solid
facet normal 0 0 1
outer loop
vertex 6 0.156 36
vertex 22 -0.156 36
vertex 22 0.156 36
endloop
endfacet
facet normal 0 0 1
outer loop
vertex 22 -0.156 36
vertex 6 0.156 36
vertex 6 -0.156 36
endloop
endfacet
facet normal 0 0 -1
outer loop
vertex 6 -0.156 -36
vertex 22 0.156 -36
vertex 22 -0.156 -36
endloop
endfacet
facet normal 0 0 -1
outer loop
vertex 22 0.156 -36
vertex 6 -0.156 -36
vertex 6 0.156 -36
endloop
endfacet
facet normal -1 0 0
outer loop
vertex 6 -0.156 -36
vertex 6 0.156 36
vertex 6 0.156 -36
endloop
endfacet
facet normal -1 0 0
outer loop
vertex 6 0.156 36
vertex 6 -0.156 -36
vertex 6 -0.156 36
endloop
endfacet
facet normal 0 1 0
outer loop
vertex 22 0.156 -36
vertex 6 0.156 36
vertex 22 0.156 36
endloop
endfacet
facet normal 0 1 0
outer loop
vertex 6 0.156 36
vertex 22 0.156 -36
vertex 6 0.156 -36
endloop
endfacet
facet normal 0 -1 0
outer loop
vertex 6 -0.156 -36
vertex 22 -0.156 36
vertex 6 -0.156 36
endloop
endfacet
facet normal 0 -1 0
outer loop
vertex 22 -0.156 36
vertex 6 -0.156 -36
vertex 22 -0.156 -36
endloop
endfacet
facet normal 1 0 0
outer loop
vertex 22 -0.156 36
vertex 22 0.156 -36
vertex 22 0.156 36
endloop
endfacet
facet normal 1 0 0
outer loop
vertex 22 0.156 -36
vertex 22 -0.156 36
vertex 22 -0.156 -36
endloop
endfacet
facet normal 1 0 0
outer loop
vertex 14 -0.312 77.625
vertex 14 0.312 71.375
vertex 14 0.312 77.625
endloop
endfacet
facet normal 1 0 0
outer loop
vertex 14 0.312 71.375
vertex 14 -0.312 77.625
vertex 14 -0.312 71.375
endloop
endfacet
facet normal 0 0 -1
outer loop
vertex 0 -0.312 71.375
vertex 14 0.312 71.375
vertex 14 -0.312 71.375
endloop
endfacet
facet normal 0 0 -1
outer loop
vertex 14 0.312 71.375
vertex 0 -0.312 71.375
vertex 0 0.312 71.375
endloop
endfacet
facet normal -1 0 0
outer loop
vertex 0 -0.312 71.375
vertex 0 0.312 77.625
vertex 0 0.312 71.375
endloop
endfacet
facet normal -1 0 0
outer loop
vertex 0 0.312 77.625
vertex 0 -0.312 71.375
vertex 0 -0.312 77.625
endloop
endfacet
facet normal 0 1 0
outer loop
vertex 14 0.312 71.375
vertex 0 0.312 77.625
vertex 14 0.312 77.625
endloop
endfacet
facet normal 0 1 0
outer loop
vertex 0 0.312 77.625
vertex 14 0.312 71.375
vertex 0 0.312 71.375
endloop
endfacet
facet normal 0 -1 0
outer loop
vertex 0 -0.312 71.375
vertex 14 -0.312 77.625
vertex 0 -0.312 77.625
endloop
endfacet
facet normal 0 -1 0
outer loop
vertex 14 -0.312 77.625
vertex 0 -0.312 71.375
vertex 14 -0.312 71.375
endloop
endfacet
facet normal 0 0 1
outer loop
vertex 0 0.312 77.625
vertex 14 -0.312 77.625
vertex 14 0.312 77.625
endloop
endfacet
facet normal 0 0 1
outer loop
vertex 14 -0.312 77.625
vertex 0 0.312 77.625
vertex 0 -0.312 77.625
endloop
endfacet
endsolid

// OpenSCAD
slat_width = 8/4; 
slat_height = 5/16;
slat_length = 72;
slat_count = 7; 

for ( y = [0:slat_width:slat_width*slat_count] ) { 
	translate([y+(slat_width*slat_count)/2,0,0]) 
	cube( [slat_width,slat_height,slat_length], center=true ); 
}

cross_width = slat_width * slat_count; 
cross_height = 5/8; 
cross_length = 1+(1/4); 
cross_count = 4; 
for ( z = [0:cross_length:cross_length*cross_count]){ 
	translate([cross_width/2,0,slat_length+z])
	cube( [cross_width,cross_height,cross_length],center=true); 
}
